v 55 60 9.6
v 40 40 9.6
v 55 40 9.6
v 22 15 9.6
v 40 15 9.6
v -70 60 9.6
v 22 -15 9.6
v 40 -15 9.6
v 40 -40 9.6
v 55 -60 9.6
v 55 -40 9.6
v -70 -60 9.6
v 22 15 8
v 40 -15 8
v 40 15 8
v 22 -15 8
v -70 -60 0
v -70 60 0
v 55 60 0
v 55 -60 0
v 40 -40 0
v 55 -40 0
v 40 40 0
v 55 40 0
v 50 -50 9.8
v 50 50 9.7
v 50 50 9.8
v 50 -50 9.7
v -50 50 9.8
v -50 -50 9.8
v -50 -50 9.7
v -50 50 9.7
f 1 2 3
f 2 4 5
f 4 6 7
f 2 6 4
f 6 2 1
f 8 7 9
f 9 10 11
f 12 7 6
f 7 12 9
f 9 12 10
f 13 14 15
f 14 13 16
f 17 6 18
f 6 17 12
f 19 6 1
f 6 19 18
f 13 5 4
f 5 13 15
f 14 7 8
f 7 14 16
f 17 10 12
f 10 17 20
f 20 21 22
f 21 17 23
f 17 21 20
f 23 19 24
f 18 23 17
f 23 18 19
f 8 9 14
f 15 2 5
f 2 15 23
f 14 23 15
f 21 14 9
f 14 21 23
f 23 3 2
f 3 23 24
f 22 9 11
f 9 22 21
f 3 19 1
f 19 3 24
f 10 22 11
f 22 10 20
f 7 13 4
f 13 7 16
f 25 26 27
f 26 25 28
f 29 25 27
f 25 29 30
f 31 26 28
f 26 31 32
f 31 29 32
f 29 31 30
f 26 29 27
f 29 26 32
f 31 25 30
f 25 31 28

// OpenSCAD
// file: stencil-frame.scad
$fa = 1.0;
$fs = 0.4;

use <../lib/lib.scad>
use <./pcb.scad>

function stencilWidth() = 100;
function stencilDepth() = stencilWidth();
function stencilHeight() = 0.1;

function stencilFrameWidth() = 1.4 * stencilWidth();
function stencilFrameDepth() = 1.2 * stencilDepth();
function stencilFrameHeight() = 8;

module stencil()
{
	translate
	([
		-0.5 * stencilWidth(),
		-0.5 * stencilDepth(),
		0
	])
	cube
	([
		stencilWidth(),
		stencilDepth(),
		stencilHeight()
	]);
}

module stencilFrame()
{
	difference()
	//union()
	{
		union()
		{
			translate([-0.5 * stencilFrameWidth(), -0.5 * stencilFrameDepth(), 0])
			cube
			([
				stencilFrameWidth(),
				stencilFrameDepth(),
				stencilFrameHeight()
			]);

			// shoulder
			cmirror([0, 1, 0])
			translate
			([
				-0.5 * stencilFrameWidth(),
				0.5 * pcbDepth(),
				stencilFrameHeight()
			])
			cube
			([
				stencilFrameWidth(),
				0.5 * (stencilFrameDepth() - pcbDepth()),
				pcbHeight()
			]);

			mirror([1, 0, 0])
			translate
			([
				0.5 * pcbWidth(),
				-0.5 * stencilFrameDepth(),
				stencilFrameHeight()
			])
			cube
			([
				0.5 * (stencilFrameWidth() - pcbWidth()),
				stencilFrameDepth(),
				pcbHeight()
			]);
			}

		translate
		([
			0.5 * stencilFrameWidth() - 30,
			-40,
			-stencilFrameHeight()
		])
		cube
		([
			50,
			80,
			3 * stencilFrameHeight()
		]);

		translate
		([
			0.5 * stencilFrameWidth() - 15,
			-0.6 * stencilFrameDepth(),
			-stencilFrameHeight()
		])
		cube
		([
			50,
			1.2 * stencilFrameDepth(),
			3 * stencilFrameHeight()
		]);

	}

}
// file: pcb.scad
function pcbWidth() = 44;
function pcbDepth() = 30;
function pcbHeight() = 1.6;

module pcb()
{
	translate([-0.5 * pcbWidth(), -0.5 * pcbDepth(), 0])
	cube
	([
		pcbWidth(), 
		pcbDepth(),
		pcbHeight()
	]);
}
// file: ../lib/lib.scad
function sel(v, indices) = [ for (i = indices) v[i] ];
function eps() = 0.01;

module cmirror(v = [1, 0, 0])
{
	children();
	mirror(v)
		children();
}

module rcube2d
(
	s = [10, 10, 10],
	r = 2,
	singleSided = false,
)
{
	width = s[0];
	depth = s[1];
	height = s[2];

	union()
	{
		cmirror([0, 1, 0])
		cmirror()
		translate([(width - r) / 2, (depth - r) / 2, 0])
		cylinder(h = height, d = r);
		translate([-(width - r) / 2, -depth / 2, 0])
		cube([width - r, depth, height]);
		translate([-width / 2, -(depth - r) / 2, 0])
		cube([width, depth - r, height]);
	}

	if (singleSided)
	{
		translate([-width / 2, -depth / 2, 0])
		cube([width, r, height]);
	}
}

module rcube3d
(
	s = [10, 10, 10],
	r = 2,
	singleSided = false,
)
{
	width = s[0];
	depth = s[1];
	height = s[2];

	w2 = width - r;
	d2 = depth - r;
	h2 = height - r;

	translate([0, 0, r / 2])
	rcube2d([width, depth, h2], r);

	translate([0, 0, height / 2])
	cmirror([0, 0, 1])
	cmirror([0, 1, 0])
	translate([0, d2 / 2, (height - r) / 2])
	translate([-w2 / 2, 0, 0])
	rotate([0, 90, 0])
	cylinder(h = w2, d = r);

	translate([0, 0, height / 2])
	cmirror([0, 0, 1])
	cmirror()
	translate([w2 / 2, 0, h2 / 2])
	translate([0, d2 / 2, 0])
	rotate([90, 0, 0])
	cylinder(h = d2, d = r);

	translate([-w2 / 2, -d2 / 2, 0])
	cube([w2, d2, height]);

	translate([0, 0, height / 2])
	cmirror([0, 0, 1])
	cmirror([0, 1, 0])
	cmirror()
	translate([w2 / 2, d2 / 2, h2 / 2])
	sphere(r / 2);

	if (singleSided)
	{
		translate([0, -depth / 2, height / 2])
		rotate([-90, 0, 0])
		rcube2d([width, height, r], r);
	}
}

module rcube
(
	s = [10, 10, 10],
	r = 2,
	flat = true,
	singleSided = false,
	aX = 0,
	aY = 0,
	aZ = 0,
)
{
	width = s[0];
	depth = s[1];
	height = s[2];

	rw = r > width ? width : r;

	translate
	([
		(1 - aX) * width / 2,
		(1 - aY) * depth / 2,
		-aZ * height / 2
	])
	if (flat)
		rcube2d(s, rw, singleSided);
	else
	{
		rh = rw > height ? height : rw;
		rcube3d(s, rh, singleSided);
	}
}

module chamfer
(
	s = [10, 20, 6],
	round = true,
	aX = 0,
	aY = 0,
	aZ = 0,
	rotation = 0,
)
{
	width = s[0];
	depth = s[1];
	height = s[2];

	r = width < height ? width : height;

	rotate([0, rotation * 90, 0])
	translate
	([
		-aX * r / 2,
		-aY * depth / 2,
		-aZ * r / 2
	])
	if (round)
	{
		difference()
		{
			cube(s);

			translate([r, -depth / 2, 0])
			union()
			{
				translate([0, 0, r])
				rotate([-90, 0, 0])
				cylinder(d = 2 * r, h = 2 * depth);

				translate([0, 0, -r / 2])
				cube([2 * width, 2 * depth, 2 * r]);

				translate([-1.5 * r, 0, r])
				cube([2 * r, 2 * depth, 2 * height]);
			}
		}
	}
	else
	{
		difference()
		{
			cube(s);

			translate([0, 1.5 * depth, 0])
			rotate([90, 0, 0])
			linear_extrude(2 * depth)
			polygon
			([
				[ 2 * width, -1 * height],
				[ 2 * width,  2 * height],
				[-1 * width,  2 * height],
			]);
		}
	}
}
// main file
$fa = 1.0;
$fs = 0.4;

use <../lib/lib.scad>
use <./pcb.scad>
use <./stencil-frame.scad>

extShow = true;

color([0.6, 0.6, 0.6, 1])
stencilFrame();

if (extShow)
{

	color([0, 0.6, 0, 1])
	translate([0, 0, stencilFrameHeight()])
	pcb();

	color([0.8, 0.8, 0.8, 0.6])
	translate([0, 0, stencilFrameHeight() + pcbHeight() + 0.1])
	stencil();

}
